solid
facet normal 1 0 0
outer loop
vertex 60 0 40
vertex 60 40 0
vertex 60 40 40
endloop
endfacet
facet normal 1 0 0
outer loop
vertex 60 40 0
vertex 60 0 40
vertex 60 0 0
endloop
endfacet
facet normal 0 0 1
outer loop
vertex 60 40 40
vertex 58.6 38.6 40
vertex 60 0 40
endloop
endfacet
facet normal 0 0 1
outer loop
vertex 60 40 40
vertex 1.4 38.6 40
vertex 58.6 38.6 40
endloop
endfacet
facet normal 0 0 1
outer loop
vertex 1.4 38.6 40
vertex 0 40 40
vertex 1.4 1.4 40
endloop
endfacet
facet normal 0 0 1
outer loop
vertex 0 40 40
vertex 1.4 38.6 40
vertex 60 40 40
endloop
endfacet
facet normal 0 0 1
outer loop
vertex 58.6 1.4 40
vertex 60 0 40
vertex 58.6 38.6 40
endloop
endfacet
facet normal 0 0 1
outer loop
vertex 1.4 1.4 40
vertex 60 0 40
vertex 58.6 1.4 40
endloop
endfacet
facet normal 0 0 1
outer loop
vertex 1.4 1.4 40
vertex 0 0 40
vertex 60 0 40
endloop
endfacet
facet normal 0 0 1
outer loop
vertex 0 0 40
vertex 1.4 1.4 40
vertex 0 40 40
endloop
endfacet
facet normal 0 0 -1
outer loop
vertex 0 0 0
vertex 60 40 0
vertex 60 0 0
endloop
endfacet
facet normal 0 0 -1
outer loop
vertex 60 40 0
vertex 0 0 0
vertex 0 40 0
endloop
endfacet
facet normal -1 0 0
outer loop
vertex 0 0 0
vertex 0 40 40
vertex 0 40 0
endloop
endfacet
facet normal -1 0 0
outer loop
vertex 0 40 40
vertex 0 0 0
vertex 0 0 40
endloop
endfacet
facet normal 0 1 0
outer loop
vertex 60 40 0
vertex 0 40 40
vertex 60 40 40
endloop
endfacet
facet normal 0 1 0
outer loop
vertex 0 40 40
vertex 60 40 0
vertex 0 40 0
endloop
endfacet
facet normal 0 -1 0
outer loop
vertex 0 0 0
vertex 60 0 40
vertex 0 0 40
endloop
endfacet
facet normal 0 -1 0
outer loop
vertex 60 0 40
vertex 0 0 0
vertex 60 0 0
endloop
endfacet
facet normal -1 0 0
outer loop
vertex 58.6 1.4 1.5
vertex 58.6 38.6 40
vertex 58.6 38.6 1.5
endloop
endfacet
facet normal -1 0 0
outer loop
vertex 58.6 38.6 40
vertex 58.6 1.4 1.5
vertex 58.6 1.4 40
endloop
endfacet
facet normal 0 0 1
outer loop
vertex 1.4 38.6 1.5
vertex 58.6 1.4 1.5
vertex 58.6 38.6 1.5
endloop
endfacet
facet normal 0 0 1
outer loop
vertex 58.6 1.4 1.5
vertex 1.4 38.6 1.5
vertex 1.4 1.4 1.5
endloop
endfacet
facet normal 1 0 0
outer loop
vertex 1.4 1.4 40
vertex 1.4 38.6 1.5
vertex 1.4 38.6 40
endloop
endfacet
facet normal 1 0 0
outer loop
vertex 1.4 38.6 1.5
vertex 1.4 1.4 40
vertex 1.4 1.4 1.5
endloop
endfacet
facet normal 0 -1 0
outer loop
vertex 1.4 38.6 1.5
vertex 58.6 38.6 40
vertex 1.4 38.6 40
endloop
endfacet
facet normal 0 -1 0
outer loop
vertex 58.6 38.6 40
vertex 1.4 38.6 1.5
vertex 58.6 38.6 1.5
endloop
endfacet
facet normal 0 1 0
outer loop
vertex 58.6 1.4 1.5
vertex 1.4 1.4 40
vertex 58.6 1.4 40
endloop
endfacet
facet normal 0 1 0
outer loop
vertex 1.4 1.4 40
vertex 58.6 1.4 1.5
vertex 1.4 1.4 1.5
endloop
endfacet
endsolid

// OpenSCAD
$fn = 32;

// ----------------------------------------------------------------------
// Open box: 1.4 mm walls
// ----------------------------------------------------------------------

// --- parameters (mm) ---
box_l = 60;               // outer length, X
box_w = 40;               // outer width, Y
box_h = 40;               // outer height, Z
wall = 1.4;               // wall thickness
floor = 1.5;              // floor thickness

difference() {
  cube([box_l, box_w, box_h]);
  translate([wall, wall, floor])
    cube([box_l - 2 * wall, box_w - 2 * wall, box_h]);
}
